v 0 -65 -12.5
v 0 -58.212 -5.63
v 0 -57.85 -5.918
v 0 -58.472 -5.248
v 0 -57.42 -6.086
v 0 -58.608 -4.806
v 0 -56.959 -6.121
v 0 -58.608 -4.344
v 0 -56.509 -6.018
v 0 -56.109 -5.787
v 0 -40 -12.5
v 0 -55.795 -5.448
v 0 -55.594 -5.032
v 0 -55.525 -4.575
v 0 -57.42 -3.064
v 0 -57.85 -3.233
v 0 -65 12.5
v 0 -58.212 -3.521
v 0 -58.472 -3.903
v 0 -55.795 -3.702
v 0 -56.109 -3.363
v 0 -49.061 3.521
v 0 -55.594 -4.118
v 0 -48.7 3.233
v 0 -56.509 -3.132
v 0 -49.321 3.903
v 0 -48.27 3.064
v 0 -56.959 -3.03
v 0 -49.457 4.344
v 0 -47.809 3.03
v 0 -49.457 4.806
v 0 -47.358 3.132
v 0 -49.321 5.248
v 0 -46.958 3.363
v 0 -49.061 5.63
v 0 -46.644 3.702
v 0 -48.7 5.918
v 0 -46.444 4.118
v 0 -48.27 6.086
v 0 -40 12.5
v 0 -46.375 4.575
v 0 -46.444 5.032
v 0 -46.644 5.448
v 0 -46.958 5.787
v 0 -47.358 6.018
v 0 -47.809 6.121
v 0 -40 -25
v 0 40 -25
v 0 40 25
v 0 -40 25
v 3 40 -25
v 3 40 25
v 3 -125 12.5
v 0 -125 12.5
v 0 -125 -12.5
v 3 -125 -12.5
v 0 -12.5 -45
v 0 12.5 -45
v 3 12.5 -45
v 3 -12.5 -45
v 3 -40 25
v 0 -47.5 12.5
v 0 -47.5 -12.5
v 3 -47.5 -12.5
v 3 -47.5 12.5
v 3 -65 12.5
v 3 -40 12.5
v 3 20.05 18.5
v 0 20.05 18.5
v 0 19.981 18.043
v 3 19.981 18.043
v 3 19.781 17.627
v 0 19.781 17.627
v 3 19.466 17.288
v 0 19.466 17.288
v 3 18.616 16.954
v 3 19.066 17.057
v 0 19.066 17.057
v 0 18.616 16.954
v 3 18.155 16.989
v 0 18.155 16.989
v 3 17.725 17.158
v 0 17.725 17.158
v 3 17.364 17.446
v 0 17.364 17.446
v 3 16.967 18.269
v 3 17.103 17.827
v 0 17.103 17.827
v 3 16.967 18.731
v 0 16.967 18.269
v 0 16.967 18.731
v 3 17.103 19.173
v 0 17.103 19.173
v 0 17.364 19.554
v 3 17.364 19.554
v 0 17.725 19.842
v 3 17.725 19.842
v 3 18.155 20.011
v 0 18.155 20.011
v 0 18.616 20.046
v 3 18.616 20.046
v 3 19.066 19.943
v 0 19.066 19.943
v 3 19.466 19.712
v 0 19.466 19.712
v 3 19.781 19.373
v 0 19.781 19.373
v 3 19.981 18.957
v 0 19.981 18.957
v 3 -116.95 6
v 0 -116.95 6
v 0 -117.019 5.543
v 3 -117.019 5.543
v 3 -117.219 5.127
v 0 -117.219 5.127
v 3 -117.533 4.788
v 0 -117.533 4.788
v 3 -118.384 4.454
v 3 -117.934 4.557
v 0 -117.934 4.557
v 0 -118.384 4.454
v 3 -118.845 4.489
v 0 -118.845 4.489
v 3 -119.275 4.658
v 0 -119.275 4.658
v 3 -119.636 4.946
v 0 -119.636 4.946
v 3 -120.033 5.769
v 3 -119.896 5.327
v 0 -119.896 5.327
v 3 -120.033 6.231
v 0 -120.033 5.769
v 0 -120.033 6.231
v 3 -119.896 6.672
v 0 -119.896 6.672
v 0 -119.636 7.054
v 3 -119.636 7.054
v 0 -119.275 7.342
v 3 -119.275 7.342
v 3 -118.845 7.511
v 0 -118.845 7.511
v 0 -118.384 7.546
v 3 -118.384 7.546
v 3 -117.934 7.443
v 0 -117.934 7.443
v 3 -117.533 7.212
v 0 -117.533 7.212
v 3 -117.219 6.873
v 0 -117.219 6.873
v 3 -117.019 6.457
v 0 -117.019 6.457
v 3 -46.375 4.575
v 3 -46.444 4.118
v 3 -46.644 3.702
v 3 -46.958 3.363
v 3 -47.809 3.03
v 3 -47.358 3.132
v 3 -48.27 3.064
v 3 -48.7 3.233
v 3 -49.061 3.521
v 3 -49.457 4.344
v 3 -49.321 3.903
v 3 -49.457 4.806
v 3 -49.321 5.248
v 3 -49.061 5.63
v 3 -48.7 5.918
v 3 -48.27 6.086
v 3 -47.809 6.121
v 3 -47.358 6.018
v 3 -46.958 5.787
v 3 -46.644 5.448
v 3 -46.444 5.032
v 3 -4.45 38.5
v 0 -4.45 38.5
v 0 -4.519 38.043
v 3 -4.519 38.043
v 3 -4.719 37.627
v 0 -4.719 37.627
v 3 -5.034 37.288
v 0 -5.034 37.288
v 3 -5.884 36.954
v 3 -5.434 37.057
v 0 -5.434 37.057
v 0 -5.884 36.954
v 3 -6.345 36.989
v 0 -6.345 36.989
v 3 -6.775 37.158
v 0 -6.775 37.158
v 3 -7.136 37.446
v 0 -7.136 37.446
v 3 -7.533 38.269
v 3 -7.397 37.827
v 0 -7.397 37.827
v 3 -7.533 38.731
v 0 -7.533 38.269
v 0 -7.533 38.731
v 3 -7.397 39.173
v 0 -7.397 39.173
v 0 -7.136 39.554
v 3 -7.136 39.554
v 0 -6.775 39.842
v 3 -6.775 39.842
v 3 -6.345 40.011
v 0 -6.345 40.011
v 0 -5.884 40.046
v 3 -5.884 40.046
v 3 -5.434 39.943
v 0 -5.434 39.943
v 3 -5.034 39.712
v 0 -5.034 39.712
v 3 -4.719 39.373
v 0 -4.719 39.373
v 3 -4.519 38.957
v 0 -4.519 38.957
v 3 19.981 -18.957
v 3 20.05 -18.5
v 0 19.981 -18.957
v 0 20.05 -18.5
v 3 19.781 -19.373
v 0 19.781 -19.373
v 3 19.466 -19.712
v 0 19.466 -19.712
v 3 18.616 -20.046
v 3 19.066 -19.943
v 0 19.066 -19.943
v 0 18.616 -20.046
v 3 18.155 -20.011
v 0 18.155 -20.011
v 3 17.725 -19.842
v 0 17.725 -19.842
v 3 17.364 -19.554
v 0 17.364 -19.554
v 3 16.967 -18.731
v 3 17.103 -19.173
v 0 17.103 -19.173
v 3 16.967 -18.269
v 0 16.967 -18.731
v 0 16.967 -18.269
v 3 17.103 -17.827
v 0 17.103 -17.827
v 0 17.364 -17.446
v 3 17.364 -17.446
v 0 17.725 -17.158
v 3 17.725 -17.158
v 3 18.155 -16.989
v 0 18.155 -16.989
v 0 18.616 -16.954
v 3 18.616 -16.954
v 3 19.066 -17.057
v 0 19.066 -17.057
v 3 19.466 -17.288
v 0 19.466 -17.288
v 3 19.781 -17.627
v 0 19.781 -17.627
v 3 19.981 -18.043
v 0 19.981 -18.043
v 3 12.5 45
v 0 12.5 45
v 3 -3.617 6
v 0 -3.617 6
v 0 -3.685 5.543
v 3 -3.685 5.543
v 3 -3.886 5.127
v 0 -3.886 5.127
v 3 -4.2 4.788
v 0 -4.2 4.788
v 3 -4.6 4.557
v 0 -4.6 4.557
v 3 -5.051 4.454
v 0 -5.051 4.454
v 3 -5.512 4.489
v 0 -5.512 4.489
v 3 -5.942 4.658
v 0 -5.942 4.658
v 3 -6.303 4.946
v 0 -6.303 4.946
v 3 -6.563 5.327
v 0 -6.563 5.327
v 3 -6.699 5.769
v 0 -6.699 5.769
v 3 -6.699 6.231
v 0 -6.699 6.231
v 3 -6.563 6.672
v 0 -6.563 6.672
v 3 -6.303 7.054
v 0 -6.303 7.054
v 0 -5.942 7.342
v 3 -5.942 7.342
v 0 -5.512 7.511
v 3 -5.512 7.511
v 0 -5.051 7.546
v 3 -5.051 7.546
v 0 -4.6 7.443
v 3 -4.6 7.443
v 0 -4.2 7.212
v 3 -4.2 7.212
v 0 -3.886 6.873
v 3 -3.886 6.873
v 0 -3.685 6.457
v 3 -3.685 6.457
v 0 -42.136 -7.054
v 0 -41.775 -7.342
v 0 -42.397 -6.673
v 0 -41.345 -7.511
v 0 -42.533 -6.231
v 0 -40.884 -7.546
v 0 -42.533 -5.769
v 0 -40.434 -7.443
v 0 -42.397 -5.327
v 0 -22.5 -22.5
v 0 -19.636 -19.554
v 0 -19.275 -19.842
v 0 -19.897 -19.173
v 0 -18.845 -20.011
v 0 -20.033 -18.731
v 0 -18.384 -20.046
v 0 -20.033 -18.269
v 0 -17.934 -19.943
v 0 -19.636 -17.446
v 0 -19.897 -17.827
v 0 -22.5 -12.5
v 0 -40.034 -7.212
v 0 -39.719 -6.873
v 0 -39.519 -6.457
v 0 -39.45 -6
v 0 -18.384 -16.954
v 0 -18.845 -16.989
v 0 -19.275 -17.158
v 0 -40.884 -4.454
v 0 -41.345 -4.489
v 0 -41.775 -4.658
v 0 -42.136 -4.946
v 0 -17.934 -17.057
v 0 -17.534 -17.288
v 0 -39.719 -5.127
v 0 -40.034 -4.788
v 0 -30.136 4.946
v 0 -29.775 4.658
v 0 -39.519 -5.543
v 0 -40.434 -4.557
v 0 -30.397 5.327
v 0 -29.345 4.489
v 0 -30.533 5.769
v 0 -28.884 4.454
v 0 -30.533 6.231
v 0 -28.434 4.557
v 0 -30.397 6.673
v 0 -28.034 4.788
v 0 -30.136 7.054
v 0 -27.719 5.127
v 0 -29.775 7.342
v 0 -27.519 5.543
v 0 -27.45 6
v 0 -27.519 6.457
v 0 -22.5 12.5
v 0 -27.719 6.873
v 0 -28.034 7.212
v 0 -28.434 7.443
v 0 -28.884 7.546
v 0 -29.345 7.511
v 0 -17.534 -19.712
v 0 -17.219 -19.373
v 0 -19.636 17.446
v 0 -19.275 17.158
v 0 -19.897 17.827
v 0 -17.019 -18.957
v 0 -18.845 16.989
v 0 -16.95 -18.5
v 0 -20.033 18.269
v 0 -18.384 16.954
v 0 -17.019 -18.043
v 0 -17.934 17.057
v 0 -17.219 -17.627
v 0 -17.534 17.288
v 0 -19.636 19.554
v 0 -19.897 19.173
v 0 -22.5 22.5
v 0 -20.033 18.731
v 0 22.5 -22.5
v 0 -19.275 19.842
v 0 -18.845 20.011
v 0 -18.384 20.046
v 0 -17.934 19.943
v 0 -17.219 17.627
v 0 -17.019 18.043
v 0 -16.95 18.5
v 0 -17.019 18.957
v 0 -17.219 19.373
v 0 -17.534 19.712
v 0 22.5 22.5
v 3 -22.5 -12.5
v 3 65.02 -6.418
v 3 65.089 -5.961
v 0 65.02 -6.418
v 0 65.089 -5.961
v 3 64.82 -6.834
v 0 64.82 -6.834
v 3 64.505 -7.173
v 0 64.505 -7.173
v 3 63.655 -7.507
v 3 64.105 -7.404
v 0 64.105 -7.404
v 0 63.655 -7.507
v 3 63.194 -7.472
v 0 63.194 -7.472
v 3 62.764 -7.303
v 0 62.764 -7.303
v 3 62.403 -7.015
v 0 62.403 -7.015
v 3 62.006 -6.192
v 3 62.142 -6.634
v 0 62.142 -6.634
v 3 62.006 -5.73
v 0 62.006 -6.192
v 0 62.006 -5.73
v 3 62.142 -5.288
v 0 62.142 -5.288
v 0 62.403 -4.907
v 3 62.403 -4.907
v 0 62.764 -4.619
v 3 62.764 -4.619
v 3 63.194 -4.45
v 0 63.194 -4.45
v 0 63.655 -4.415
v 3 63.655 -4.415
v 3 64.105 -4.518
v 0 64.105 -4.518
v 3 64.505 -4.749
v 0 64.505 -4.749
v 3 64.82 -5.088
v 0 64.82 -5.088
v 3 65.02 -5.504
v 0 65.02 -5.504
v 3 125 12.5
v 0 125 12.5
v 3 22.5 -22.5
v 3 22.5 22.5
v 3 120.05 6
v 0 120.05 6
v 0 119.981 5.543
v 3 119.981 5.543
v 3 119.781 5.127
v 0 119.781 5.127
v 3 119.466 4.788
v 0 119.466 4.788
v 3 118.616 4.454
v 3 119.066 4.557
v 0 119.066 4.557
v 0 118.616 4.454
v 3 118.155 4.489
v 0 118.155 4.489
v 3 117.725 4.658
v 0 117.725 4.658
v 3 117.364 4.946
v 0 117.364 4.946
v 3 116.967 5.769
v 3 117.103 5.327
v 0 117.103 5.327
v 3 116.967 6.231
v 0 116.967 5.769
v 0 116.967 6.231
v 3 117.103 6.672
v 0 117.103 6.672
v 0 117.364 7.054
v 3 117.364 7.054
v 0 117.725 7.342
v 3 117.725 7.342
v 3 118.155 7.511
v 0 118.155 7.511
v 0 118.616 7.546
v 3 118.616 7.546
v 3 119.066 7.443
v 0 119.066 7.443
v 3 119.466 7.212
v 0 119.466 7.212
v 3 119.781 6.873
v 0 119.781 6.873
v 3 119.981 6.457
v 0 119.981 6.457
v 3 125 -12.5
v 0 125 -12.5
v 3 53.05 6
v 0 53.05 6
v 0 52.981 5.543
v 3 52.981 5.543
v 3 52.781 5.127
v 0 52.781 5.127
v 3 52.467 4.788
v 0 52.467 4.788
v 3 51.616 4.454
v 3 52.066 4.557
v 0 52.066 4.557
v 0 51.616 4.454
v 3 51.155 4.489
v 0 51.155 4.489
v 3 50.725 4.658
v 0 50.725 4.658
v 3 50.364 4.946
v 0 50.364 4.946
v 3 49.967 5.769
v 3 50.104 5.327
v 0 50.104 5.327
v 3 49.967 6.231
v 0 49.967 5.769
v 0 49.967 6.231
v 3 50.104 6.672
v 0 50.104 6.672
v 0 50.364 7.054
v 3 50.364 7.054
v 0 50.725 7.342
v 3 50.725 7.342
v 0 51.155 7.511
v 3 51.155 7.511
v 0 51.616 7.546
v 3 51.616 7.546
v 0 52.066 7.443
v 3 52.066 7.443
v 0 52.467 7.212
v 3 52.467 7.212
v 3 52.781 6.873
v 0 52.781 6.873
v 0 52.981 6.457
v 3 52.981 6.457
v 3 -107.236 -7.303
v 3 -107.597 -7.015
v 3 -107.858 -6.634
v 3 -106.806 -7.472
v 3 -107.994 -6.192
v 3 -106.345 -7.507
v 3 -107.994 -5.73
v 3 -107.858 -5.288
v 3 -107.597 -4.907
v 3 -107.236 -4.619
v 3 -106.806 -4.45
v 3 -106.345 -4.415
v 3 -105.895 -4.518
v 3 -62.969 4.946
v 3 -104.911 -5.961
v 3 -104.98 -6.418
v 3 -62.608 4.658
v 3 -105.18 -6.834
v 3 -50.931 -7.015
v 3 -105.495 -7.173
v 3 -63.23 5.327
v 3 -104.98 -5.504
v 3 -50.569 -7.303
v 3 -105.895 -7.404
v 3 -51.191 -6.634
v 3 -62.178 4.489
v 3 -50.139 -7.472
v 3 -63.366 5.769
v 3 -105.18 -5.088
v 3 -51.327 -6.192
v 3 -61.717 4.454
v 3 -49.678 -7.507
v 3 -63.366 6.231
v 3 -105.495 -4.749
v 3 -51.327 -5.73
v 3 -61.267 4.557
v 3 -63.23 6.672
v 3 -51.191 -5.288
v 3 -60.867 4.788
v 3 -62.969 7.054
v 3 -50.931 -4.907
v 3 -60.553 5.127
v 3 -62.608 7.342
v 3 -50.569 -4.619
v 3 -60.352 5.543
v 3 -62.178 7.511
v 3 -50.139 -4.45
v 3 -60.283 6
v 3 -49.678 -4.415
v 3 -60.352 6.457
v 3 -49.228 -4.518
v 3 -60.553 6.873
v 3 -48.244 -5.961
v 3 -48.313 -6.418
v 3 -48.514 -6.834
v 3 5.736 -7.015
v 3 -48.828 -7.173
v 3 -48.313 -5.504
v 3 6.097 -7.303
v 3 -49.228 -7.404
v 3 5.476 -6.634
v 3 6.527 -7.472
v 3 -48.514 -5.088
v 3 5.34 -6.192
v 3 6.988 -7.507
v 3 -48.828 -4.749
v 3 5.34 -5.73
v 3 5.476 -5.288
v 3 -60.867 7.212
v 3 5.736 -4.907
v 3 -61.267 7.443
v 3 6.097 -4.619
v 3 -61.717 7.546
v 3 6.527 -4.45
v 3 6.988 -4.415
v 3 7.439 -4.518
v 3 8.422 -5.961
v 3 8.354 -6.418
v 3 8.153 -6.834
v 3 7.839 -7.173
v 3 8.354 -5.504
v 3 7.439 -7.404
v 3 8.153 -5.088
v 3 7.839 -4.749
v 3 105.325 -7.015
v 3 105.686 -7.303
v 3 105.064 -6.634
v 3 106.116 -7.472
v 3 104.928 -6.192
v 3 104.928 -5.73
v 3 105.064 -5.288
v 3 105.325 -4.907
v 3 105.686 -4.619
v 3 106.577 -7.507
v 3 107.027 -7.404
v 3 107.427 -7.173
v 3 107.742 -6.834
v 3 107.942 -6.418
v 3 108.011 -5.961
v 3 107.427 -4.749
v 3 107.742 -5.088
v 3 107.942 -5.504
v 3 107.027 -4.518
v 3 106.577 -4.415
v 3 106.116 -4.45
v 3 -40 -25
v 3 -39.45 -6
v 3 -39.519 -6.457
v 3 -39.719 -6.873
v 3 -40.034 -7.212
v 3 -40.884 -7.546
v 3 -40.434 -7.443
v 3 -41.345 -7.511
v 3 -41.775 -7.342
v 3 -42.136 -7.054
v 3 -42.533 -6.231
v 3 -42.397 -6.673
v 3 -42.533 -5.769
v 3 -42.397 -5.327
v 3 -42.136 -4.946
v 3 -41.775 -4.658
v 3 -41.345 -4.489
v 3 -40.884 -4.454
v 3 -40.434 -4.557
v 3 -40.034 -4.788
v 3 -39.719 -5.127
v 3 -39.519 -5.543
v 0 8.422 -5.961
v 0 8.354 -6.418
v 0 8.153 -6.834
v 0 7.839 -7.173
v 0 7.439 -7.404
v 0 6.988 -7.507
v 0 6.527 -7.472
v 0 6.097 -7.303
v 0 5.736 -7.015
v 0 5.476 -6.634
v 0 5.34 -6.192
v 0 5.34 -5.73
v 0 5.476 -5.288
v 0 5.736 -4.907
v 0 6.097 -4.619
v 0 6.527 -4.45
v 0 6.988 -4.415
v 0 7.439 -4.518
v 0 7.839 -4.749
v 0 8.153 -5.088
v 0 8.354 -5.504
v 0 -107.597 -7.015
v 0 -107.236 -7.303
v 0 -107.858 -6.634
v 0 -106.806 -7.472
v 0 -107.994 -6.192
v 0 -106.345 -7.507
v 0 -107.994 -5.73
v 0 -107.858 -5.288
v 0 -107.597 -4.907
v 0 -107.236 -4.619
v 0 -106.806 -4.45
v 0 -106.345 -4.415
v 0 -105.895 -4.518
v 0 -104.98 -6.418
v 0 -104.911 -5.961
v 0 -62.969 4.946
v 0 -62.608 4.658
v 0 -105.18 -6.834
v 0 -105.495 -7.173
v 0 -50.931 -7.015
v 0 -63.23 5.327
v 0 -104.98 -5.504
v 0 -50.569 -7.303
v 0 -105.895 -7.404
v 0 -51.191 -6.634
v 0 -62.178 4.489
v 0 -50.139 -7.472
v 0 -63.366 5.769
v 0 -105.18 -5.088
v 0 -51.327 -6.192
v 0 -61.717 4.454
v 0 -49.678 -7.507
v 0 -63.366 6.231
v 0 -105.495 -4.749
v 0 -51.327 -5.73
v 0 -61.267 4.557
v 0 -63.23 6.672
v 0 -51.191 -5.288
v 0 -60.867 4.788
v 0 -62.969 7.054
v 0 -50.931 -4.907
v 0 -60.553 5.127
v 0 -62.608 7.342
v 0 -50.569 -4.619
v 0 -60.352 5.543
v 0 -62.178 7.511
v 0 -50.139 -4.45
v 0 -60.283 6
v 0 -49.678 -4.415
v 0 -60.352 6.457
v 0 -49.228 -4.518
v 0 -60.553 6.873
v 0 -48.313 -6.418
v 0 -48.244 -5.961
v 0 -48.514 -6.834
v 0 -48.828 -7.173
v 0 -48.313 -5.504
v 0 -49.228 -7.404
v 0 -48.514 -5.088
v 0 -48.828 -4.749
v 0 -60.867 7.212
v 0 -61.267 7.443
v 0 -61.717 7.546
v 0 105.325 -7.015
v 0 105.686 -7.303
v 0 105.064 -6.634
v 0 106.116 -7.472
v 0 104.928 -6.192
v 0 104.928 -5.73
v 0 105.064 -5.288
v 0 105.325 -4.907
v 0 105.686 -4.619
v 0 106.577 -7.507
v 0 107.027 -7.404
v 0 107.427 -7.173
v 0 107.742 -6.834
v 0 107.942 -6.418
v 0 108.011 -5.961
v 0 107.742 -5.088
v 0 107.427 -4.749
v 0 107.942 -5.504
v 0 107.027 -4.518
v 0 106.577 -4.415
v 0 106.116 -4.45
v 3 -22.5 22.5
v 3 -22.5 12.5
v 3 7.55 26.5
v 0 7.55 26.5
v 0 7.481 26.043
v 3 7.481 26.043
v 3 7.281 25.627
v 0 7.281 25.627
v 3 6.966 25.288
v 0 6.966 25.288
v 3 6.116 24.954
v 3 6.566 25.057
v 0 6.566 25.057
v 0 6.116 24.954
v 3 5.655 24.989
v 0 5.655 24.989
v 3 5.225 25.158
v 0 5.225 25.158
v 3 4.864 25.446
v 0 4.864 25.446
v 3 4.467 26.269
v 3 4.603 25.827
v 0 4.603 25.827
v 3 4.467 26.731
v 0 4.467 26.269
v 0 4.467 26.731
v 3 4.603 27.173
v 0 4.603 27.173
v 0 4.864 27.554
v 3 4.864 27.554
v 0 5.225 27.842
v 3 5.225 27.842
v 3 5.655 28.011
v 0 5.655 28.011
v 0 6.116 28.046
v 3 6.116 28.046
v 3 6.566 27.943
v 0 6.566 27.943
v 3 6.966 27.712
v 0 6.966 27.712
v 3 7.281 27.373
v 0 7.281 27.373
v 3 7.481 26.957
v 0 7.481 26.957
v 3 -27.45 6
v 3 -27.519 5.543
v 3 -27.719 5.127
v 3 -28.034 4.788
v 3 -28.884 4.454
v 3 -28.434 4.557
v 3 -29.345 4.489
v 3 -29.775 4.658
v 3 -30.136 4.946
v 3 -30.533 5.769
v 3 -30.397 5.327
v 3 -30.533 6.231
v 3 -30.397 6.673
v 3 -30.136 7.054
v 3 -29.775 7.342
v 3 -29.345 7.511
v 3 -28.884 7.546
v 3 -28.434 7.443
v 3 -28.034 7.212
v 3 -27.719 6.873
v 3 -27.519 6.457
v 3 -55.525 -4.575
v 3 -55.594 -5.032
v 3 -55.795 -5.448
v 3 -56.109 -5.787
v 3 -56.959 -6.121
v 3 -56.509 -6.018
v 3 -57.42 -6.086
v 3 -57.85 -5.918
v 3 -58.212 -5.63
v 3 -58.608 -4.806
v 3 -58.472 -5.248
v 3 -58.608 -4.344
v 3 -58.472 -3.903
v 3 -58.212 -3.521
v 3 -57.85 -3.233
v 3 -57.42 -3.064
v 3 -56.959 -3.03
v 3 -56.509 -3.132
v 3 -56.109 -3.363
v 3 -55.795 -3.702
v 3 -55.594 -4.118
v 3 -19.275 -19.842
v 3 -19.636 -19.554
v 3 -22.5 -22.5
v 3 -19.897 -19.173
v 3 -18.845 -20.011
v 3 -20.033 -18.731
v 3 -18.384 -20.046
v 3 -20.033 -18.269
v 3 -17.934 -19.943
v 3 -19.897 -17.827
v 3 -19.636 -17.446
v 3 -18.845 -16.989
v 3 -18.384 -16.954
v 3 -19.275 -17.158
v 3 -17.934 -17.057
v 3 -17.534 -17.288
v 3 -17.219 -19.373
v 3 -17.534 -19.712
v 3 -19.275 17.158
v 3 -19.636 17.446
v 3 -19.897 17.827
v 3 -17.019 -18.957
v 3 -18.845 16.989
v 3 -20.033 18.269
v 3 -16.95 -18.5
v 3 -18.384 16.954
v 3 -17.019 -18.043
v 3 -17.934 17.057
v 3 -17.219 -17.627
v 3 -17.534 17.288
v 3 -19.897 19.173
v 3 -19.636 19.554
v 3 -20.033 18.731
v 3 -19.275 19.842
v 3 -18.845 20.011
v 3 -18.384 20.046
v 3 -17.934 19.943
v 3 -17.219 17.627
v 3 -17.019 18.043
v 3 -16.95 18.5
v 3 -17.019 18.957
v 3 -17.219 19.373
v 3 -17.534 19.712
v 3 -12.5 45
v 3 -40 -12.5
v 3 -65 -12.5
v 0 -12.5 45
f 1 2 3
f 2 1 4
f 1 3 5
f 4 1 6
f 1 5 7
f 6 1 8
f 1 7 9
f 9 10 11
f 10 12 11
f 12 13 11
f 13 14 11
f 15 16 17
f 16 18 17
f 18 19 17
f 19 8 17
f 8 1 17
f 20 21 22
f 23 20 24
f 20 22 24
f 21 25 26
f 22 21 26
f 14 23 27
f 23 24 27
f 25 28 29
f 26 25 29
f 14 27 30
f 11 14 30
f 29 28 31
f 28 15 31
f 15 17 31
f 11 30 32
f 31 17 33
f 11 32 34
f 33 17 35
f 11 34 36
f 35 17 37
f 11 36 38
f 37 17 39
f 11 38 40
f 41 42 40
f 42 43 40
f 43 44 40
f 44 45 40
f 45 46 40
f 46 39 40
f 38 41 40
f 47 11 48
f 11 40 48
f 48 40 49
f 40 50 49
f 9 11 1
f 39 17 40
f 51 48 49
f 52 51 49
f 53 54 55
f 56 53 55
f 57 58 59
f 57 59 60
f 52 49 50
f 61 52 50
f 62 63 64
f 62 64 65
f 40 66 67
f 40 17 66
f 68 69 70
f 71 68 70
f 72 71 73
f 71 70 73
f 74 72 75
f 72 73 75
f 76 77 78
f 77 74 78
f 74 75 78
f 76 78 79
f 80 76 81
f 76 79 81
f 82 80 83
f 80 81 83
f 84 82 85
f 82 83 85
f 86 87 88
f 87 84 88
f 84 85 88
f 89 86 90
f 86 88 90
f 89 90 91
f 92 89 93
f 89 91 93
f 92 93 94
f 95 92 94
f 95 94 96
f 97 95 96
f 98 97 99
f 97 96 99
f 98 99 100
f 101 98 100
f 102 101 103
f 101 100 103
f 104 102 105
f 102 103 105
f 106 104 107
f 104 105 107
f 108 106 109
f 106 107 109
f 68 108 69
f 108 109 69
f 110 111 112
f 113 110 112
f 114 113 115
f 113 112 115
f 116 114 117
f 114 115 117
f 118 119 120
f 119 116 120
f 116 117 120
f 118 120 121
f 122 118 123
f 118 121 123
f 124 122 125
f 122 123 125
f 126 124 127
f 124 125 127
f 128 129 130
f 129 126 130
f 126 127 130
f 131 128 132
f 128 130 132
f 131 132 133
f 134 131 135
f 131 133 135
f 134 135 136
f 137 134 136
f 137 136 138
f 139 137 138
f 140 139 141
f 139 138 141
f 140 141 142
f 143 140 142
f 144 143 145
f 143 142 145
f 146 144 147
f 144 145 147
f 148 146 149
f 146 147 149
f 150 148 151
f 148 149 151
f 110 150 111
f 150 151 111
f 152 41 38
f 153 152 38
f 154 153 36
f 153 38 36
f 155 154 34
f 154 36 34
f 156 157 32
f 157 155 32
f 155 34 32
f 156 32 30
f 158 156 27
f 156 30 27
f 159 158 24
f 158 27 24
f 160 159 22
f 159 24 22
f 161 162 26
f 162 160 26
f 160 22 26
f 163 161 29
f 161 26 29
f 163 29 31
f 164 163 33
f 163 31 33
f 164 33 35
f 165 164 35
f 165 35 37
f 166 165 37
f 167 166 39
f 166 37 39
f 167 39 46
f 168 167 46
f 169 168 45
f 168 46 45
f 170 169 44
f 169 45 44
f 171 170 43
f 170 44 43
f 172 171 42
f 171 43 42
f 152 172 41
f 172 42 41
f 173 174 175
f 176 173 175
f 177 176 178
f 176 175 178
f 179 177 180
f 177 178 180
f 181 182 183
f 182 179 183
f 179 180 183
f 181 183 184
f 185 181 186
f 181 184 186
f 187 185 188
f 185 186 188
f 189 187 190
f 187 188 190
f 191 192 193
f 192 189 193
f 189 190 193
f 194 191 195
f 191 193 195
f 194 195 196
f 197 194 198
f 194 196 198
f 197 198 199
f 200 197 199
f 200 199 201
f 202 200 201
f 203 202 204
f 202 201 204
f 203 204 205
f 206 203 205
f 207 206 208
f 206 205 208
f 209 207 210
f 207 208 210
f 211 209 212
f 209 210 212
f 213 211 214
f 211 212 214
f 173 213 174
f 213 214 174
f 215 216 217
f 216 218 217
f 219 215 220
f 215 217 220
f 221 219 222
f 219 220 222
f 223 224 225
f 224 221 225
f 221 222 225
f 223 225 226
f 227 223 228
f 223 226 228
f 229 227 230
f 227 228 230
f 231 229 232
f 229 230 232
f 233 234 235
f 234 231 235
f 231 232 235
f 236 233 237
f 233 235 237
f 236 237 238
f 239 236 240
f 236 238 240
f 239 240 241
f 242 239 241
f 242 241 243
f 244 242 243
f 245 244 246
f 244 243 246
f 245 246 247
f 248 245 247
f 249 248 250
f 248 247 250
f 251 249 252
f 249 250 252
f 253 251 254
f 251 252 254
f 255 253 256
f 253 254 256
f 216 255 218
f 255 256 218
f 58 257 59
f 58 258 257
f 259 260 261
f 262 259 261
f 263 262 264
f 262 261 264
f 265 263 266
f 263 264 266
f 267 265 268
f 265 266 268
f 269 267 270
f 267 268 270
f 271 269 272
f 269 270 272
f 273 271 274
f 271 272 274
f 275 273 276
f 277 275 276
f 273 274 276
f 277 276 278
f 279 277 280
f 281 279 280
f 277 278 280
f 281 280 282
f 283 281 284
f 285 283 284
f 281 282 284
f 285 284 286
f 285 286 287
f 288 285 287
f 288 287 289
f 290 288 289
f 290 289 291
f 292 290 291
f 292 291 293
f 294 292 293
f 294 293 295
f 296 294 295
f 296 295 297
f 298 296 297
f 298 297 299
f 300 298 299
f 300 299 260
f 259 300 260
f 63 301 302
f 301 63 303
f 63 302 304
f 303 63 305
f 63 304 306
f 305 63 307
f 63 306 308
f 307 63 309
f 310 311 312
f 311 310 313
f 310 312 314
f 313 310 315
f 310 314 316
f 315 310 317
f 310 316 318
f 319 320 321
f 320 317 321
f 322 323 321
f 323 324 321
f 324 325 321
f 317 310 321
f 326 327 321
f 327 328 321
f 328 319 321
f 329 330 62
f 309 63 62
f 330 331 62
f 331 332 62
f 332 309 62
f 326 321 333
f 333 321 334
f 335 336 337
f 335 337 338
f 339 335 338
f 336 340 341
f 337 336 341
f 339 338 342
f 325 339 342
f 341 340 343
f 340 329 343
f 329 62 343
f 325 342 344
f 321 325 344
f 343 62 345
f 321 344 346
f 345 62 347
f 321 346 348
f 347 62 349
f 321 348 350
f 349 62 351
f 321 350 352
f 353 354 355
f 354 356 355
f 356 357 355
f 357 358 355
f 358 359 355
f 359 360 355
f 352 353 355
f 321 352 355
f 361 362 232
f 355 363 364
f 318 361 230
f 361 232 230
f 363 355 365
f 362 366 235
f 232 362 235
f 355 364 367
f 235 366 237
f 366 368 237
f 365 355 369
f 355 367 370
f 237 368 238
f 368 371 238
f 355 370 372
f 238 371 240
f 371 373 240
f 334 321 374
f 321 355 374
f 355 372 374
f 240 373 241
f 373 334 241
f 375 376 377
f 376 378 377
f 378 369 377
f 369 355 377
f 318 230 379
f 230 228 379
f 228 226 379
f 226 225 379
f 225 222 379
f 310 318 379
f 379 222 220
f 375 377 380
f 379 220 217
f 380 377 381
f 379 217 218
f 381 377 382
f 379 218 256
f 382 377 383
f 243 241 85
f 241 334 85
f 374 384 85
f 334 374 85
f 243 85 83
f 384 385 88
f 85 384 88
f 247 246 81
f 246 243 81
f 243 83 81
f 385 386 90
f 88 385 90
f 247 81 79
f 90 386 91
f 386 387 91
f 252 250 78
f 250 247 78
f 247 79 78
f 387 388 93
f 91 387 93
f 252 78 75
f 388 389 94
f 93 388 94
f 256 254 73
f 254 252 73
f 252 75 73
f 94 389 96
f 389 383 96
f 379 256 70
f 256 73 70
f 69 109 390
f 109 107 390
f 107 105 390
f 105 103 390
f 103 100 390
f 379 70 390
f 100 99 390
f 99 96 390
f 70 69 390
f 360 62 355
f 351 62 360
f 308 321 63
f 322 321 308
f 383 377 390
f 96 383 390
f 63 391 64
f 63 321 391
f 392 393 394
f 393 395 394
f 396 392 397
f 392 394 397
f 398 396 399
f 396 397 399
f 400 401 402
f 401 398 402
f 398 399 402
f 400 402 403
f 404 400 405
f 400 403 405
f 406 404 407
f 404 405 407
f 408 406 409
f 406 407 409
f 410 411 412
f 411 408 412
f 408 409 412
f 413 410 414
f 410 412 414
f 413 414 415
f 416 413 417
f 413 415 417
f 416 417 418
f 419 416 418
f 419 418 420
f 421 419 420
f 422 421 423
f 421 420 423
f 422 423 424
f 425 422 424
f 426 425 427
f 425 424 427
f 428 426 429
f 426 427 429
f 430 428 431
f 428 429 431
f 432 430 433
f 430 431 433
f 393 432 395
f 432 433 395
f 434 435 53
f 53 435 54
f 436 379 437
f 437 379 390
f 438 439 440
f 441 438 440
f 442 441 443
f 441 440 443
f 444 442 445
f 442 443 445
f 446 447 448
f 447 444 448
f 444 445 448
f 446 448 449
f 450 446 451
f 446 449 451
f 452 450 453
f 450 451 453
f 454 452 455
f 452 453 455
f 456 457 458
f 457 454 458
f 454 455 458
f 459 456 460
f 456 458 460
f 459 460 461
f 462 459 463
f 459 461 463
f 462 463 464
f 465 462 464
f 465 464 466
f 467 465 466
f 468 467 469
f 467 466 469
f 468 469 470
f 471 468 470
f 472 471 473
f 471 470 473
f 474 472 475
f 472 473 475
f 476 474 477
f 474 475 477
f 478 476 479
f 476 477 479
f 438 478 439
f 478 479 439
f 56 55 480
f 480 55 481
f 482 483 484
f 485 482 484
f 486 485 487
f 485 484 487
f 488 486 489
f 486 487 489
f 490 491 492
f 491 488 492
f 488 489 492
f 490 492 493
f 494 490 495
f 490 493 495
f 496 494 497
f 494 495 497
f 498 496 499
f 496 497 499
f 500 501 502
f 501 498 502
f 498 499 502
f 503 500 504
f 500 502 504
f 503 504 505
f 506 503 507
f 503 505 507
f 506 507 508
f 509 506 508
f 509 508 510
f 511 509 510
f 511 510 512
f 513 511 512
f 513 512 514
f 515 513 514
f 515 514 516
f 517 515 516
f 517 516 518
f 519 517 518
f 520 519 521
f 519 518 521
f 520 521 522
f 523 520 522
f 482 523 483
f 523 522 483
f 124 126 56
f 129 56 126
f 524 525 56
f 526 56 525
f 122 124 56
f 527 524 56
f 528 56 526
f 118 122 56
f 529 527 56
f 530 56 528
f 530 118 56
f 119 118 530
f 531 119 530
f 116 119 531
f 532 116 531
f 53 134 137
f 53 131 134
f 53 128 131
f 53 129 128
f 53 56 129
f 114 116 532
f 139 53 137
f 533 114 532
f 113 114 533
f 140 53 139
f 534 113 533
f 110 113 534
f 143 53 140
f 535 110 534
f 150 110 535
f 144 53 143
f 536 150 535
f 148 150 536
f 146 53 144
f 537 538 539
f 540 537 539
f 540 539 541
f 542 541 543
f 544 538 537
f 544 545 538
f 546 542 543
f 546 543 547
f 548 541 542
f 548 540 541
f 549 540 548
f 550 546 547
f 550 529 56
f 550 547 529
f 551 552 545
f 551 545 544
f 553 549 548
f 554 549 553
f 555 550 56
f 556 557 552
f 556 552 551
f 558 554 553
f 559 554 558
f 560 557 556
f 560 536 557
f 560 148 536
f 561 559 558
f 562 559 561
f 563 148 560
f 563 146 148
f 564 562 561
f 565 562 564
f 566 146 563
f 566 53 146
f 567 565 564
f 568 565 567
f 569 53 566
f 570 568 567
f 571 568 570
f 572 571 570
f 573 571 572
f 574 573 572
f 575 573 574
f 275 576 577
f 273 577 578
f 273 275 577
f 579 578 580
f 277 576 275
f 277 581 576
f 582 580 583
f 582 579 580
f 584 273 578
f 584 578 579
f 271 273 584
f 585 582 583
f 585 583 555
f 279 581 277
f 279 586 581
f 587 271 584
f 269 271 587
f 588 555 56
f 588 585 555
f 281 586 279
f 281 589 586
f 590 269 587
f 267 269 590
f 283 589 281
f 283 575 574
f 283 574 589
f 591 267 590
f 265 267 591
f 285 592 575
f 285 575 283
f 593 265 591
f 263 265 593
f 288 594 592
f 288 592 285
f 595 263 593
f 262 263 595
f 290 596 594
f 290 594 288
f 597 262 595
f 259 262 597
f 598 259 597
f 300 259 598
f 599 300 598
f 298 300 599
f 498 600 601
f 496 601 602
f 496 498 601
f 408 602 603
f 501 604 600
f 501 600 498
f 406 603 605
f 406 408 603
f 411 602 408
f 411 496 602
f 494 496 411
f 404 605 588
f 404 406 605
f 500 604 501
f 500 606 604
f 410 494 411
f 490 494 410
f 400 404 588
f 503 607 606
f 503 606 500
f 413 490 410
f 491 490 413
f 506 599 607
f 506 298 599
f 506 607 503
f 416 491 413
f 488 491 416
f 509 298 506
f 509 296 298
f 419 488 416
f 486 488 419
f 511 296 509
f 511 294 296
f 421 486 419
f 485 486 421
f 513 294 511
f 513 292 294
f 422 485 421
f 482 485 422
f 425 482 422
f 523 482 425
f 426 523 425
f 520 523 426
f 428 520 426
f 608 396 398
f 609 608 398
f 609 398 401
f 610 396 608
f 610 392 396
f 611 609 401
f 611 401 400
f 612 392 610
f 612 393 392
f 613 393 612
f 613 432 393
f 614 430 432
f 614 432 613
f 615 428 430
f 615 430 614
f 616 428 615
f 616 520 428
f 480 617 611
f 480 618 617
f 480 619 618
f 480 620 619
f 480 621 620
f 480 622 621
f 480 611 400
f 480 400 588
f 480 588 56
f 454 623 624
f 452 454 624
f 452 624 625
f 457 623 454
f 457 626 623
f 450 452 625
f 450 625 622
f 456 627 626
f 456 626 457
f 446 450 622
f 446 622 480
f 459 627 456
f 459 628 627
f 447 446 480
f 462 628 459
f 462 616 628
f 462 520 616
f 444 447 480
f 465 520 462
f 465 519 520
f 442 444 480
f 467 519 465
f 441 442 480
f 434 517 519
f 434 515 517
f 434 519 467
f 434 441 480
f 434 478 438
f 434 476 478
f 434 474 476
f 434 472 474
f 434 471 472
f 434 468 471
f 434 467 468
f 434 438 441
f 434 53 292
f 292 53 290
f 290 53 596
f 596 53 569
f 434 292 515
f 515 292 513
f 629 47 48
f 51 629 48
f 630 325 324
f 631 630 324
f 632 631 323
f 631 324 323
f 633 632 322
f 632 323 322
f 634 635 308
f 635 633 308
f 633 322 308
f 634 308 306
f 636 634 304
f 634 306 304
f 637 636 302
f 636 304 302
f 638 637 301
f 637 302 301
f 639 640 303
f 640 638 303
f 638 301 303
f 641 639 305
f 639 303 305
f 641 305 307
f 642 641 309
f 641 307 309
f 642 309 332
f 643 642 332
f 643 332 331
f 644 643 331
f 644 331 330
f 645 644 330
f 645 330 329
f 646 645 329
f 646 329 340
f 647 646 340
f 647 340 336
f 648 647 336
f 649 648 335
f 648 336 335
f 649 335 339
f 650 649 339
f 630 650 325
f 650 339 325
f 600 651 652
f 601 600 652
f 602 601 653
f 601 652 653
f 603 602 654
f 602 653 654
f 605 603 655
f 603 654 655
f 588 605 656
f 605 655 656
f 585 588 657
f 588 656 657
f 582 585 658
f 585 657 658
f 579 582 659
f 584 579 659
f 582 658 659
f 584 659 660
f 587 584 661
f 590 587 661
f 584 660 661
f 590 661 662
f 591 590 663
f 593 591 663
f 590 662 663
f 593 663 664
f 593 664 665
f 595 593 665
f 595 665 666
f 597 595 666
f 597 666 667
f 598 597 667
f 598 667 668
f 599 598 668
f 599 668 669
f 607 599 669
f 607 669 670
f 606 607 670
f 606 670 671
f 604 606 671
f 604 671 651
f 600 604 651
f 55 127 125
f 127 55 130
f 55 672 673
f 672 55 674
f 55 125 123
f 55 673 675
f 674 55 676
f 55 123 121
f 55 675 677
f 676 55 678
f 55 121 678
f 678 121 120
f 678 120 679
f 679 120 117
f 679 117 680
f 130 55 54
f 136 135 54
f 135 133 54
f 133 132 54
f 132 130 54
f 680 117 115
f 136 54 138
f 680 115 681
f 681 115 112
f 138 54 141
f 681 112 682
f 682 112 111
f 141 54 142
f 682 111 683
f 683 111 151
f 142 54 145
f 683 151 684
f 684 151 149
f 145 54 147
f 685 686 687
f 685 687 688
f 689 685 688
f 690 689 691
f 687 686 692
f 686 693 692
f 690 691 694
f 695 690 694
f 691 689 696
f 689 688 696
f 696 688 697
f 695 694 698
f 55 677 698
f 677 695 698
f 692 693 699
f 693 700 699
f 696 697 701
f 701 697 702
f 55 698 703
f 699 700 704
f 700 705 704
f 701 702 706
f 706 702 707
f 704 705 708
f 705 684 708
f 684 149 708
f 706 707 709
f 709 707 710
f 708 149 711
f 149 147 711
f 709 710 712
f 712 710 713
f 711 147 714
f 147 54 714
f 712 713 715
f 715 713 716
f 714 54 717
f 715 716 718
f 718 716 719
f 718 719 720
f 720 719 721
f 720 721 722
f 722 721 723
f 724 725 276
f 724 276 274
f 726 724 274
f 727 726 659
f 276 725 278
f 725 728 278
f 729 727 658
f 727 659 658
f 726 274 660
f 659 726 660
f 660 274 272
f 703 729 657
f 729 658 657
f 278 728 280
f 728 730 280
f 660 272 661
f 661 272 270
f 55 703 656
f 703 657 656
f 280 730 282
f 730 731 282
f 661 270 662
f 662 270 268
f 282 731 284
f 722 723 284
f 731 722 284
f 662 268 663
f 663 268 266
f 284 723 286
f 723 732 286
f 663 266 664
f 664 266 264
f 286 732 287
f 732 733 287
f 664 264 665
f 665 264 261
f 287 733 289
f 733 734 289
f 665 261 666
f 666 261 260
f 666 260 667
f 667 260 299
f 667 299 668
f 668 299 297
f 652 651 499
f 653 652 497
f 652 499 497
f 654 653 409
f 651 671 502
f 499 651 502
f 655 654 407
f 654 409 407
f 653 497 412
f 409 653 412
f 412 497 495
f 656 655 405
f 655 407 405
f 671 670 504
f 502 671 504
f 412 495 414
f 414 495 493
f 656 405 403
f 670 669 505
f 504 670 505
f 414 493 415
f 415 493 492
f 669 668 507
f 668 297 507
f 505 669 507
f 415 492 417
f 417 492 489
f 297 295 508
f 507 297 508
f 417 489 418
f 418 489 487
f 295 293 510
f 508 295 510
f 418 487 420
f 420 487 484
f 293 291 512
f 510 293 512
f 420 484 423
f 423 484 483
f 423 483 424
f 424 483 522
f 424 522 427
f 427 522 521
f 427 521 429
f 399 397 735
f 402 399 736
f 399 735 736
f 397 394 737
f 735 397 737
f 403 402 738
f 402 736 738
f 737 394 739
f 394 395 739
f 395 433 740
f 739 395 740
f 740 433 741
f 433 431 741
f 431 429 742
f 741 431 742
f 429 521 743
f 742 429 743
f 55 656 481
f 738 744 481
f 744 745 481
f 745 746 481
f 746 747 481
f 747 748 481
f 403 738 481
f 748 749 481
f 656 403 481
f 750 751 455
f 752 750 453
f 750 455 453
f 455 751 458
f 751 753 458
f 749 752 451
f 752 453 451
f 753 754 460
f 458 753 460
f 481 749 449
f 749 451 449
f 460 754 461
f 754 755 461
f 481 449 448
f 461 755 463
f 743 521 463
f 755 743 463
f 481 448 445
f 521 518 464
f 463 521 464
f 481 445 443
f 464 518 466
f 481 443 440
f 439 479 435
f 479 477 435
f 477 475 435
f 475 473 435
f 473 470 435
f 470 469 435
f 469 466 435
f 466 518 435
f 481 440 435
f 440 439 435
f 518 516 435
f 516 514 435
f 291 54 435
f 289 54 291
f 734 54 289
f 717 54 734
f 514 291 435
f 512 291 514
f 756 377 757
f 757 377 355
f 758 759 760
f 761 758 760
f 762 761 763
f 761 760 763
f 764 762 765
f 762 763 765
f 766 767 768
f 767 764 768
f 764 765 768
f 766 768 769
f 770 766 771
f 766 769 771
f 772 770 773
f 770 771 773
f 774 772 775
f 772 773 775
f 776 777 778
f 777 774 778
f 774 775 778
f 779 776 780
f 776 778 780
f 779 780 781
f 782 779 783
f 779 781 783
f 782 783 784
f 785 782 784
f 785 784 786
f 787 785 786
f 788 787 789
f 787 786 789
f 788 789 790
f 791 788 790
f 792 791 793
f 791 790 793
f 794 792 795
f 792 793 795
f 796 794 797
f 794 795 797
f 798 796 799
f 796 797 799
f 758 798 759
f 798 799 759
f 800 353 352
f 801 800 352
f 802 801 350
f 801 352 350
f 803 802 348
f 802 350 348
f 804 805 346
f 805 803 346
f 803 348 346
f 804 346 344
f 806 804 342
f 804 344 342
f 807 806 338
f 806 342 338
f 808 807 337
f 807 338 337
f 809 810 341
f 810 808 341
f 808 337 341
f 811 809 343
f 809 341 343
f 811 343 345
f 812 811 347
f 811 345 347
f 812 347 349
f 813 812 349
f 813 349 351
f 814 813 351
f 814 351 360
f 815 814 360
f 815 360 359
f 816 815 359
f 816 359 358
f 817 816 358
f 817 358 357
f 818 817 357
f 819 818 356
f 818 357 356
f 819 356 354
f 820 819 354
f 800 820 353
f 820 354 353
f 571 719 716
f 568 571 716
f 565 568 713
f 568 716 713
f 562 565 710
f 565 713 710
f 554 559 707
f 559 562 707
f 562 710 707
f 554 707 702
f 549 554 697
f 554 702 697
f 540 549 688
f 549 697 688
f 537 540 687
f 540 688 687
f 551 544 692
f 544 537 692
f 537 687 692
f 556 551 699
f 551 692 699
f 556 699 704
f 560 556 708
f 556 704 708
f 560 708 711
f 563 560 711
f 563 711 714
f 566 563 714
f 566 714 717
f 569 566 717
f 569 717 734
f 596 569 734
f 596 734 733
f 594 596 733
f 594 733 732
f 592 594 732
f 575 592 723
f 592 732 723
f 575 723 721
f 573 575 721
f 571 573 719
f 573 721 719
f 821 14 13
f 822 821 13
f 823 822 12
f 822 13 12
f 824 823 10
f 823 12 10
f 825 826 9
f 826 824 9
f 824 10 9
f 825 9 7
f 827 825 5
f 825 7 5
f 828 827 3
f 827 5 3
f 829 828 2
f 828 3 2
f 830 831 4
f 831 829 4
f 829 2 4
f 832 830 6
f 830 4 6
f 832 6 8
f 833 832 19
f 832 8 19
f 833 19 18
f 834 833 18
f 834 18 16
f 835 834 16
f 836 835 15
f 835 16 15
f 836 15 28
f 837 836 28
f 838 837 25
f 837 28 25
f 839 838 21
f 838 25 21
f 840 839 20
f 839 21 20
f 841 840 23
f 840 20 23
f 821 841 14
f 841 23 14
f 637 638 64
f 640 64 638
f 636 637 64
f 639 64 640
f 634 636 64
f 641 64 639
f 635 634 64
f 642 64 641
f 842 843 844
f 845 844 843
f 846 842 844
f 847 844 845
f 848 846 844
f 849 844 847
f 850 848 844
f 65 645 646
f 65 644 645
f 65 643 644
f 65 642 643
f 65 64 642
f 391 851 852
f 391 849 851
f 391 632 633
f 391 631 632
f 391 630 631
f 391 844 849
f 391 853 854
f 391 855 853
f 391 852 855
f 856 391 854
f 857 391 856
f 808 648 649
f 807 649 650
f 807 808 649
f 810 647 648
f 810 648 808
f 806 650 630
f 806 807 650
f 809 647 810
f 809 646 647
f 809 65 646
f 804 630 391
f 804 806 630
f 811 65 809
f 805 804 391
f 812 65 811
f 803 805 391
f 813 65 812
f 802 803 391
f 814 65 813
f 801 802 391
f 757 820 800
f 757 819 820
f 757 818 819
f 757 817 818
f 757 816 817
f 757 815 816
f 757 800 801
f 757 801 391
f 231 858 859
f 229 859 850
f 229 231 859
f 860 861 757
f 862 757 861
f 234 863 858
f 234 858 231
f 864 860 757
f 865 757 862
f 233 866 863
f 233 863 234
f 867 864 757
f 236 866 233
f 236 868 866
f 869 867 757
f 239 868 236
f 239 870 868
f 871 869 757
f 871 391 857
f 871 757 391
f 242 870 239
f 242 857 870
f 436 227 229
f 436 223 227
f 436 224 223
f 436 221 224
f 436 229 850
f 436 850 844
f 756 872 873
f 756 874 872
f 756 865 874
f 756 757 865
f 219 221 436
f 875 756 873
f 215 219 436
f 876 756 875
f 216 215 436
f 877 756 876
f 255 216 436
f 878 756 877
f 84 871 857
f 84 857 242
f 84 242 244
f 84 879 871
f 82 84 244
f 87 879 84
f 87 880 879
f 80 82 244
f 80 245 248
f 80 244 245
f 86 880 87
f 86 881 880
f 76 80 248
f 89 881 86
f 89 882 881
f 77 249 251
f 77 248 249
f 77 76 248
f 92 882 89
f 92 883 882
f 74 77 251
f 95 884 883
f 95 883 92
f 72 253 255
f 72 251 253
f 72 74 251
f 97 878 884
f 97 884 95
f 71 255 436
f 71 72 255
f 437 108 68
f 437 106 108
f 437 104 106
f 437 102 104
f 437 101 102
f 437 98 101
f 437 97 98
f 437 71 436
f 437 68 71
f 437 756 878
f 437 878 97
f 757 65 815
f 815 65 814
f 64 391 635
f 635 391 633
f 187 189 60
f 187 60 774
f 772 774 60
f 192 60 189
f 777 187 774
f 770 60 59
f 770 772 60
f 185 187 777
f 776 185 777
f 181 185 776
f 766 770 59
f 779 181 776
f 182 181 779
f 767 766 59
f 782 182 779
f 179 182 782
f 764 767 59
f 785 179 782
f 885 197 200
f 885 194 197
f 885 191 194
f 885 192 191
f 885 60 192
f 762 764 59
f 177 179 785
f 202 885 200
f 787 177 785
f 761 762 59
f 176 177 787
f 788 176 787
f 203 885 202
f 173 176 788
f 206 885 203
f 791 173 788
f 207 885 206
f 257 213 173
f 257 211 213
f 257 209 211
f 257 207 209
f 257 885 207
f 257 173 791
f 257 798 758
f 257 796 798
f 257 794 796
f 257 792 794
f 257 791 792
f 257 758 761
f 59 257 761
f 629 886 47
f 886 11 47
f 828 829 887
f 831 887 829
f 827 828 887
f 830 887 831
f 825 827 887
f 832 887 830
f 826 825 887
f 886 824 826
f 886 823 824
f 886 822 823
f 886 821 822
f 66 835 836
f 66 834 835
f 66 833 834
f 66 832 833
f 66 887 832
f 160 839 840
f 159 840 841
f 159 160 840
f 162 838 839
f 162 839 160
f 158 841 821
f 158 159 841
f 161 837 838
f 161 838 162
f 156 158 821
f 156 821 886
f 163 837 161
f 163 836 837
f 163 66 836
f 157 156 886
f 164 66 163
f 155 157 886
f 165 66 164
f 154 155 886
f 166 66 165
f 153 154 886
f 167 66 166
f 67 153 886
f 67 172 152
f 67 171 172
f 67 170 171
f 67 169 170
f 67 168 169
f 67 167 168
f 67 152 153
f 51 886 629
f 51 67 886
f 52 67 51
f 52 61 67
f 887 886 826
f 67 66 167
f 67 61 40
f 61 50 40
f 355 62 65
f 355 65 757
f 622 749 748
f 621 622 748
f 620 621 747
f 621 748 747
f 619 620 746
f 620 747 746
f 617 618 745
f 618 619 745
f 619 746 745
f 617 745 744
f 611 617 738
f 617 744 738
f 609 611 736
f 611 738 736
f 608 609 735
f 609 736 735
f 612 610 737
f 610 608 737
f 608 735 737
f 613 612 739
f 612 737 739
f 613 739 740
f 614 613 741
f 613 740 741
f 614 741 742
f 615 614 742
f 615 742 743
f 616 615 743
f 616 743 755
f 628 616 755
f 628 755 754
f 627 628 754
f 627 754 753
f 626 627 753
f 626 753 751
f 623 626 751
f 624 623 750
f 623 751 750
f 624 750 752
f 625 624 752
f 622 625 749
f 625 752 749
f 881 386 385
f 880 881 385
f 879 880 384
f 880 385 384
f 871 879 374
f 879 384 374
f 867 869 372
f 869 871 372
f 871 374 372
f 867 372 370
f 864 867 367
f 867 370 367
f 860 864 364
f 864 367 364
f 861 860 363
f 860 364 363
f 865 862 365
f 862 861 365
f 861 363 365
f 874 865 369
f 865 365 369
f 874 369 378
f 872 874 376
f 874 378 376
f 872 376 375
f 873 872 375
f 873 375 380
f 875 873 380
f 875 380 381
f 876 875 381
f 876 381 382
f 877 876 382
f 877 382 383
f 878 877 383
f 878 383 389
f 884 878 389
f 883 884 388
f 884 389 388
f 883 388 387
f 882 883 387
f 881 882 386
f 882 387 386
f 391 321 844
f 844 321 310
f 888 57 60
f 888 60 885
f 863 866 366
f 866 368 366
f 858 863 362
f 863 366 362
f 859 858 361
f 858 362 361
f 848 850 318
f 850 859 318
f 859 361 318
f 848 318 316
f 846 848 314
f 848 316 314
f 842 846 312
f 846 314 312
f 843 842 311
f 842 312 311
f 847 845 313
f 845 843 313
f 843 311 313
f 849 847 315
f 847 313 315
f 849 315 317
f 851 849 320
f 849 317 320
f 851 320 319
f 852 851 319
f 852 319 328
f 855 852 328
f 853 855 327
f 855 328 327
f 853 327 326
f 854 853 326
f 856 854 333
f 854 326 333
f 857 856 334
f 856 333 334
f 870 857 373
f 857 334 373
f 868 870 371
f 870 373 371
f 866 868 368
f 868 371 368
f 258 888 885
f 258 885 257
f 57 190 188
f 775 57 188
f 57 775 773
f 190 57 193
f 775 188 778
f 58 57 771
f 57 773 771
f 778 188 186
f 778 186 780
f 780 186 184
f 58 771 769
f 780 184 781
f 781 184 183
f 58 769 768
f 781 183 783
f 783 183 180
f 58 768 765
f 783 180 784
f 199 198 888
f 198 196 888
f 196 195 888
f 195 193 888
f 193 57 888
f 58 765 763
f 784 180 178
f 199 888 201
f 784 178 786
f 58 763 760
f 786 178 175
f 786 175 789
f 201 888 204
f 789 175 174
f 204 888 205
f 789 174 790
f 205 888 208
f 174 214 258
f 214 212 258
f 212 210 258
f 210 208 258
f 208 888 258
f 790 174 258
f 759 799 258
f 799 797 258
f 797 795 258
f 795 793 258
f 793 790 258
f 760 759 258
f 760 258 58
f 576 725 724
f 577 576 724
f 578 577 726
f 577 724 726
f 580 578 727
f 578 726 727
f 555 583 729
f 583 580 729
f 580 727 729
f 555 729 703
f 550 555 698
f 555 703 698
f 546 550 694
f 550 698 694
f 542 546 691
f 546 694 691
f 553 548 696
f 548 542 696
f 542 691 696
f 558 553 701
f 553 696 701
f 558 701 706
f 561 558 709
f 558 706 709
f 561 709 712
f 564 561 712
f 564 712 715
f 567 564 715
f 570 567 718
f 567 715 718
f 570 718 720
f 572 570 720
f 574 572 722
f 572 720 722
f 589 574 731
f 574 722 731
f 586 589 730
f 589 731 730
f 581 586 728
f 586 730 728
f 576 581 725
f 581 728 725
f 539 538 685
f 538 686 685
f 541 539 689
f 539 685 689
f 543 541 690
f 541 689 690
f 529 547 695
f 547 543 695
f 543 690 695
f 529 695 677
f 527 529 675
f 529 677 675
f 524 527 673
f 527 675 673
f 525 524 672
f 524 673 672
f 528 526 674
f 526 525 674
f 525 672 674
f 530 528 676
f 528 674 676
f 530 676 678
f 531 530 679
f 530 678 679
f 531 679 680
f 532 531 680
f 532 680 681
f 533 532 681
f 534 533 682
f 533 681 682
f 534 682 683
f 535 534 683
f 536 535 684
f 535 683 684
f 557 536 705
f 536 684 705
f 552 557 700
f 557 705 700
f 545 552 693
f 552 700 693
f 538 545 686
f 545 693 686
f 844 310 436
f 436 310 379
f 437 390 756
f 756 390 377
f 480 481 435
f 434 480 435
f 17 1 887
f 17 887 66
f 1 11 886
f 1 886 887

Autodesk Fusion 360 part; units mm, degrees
sketch "Sketch1" plane through (0, 0, 0) normal (1, 0, 0) x (0, 1, 0) in component "Motor driver fitter"
  line L0 (-22.5, -22.5) -> (22.5, -22.5)
  line L1 (-47.5, -12.5) -> (-47.5, 12.5)
  line L2 (-22.5, -12.5) -> (-47.5, -12.5)
  circle A0 centre (-29, 6) radius 1.55
  circle A1 centre (-41, -6) radius 1.55
  line L3 (-47.5, 12.5) -> (-22.5, 12.5)
  line L4 (22.5, 22.5) -> (-22.5, 22.5)
  line L5 (22.5, -22.5) -> (22.5, 22.5)
  circle A2 centre (-18.5, 18.5) radius 1.55
  line L6 (-22.5, 22.5) -> (22.5, -22.5) construction
  line L7 (-22.5, -22.5) -> (22.5, 22.5) construction
  circle A3 centre (18.5, 18.5) radius 1.55
  circle A4 centre (-18.5, -18.5) radius 1.55
  circle A5 centre (18.5, -18.5) radius 1.55
  line L8 (-22.5, 22.5) -> (-22.5, 12.5)
  line L9 (-22.5, -12.5) -> (-22.5, -22.5)
  line L10 (-22.5, 12.5) -> (-47.5, -12.5) construction
  line L11 (-41, -6) -> (-47.5, -12.5) construction
  line L12 (-29, 6) -> (-22.5, 12.5) construction
  dimension "d171" = 45
  dimension "d172" = 45
  dimension "d174" = 3.1
  dimension "d185" = 3.1
  dimension "d186" = 3.1
  dimension "d188" = 25
  dimension "d189" = 25
  dimension "d192" = 18.5
  dimension "d193" = 18.5
  dimension "d225" = 16.9706
sketch "Sketch1 (2)" plane through (0, 0, 0) normal (1, 0, 0) x (0, 1, 0) in component "Chassis frame"
  line L0 (-125, 12.5) -> (-125, -12.5)
  circle A0 centre (-106.461, -5.961) radius 1.55
  line L1 (125, -12.5) -> (125, 12.5)
  line L2 (125, 12.5) -> (-125, 12.5)
  circle A1 centre (-118.4999, 5.9999) radius 1.55
  line L3 (-125, -12.5) -> (125, -12.5)
  line L4 (-125, 12.5) -> (125, -12.5) construction
  line L5 (-125, -12.5) -> (125, 12.5) construction
  line L6 (-22.5, 22.5) -> (22.5, -22.5)
  circle A2 centre (-6, 115) radius 1.55
  circle A3 centre (6, 103) radius 1.55
  line L7 (0, 12.5) -> (0, -12.5) construction
  line L8 (-125, 12.5) -> (-100, -12.5) construction
  line L9 (-125, 12.5) -> (-91.4846, 12.5) construction
  line L10 (-125, 12.5) -> (-118.4999, 5.9999) construction
  line L11 (-106.461, -5.961) -> (-100, -12.5) construction
  circle A4 centre (118.4999, 5.9999) radius 1.55
  circle A5 centre (106.461, -5.961) radius 1.55
  circle A6 centre (-49.7943, -5.961) radius 1.55
  circle A7 centre (-61.8332, 5.9999) radius 1.55
  circle A8 centre (6.8724, -5.961) radius 1.55
  circle A9 centre (-5.1666, 5.9999) radius 1.55
  circle A10 centre (63.539, -5.961) radius 1.55
  circle A11 centre (51.5001, 5.9999) radius 1.55
  point P0 (22, -6.0625)
  dimension "d199" = 250
  dimension "d200" = 25
  dimension "d201" = 3.1
  dimension "d202" = 3.1
  dimension "d231" = 45
  dimension "d232" = 16.9706
  dimension "d235" = 170
  dimension "d236" = 0
sketch "Sketch1 (3)" plane through (0, 0, 0) normal (1, 0, 0) x (0, 1, 0) in component "Motor fitter"
  line L0 (-12.5, -45) -> (-12.5, 45)
  line L1 (-12.5, 45) -> (12.5, 45)
  line L2 (12.5, 45) -> (12.5, -45)
  line L3 (12.5, -45) -> (-12.5, -45)
  line L4 (-12.5, -45) -> (12.5, 45) construction
  line L5 (-12.5, 45) -> (12.5, -45) construction
  line L6 (-12.5, 45) -> (12.5, 20) construction
  line L7 (-12.5, 45) -> (24.7988, 45) construction
  circle A0 centre (-6, 38.5) radius 1.55
  circle A1 centre (6, 26.5) radius 1.55
  line L8 (6, 26.5) -> (12.5, 20) construction
  line L9 (-6, 38.5) -> (-12.5, 45) construction
  dimension "d222" = 25
  dimension "d223" = 90
  dimension "d227" = 45
  dimension "d228" = 3.1
  dimension "d229" = 3.1
  dimension "d230" = 16.9706
sketch "Sketch1 (4)" plane through (0, 0, 0) normal (1, 0, 0) x (0, 1, 0) in component "Breadboard fitter"
  line L0 (-65, 12.5) -> (-40, 12.5)
  line L1 (-40, 12.5) -> (-40, -12.5)
  line L2 (-40, -12.5) -> (-65, -12.5)
  line L3 (-65, -12.5) -> (-65, 12.5)
  line L4 (40, 25) -> (-40, 25)
  line L5 (-40, 25) -> (-40, -25)
  line L6 (-40, -25) -> (40, -25)
  line L7 (40, -25) -> (40, 25)
  line L8 (40, 25) -> (-40, -25) construction
  line L9 (-40, 25) -> (40, -25) construction
  circle A0 centre (-57.0753, -4.5753) radius 1.55
  circle A1 centre (-47.9247, 4.5753) radius 1.55
  line L10 (-47.9247, 4.5753) -> (-40, 12.5) construction
  line L11 (-57.0753, -4.5753) -> (-65, -12.5) construction
  dimension "d237" = 25
  dimension "d238" = 25
  dimension "d239" = 80
  dimension "d240" = 50
  dimension "d241" = 3.1
  dimension "d242" = 3.1
  dimension "d244" = 12.9408
  dimension "d245" = 45
extrude "Extrude1" add sketch "Sketch1 (4)" along normal blind 3 makes body 1 in component "Breadboard fitter"
sketch "Laser cut sketch" plane through (3, 0, 0) normal (1, 0, 0) x (0, 1, 0) in component "Breadboard fitter"
  circle A0 centre (-57.0753, -4.5753) radius 1.55
  circle A1 centre (-47.9247, 4.5753) radius 1.55
  line L0 (-40, -12.5) -> (-40, -25)
  line L1 (-40, -25) -> (40, -25)
  line L2 (40, -25) -> (40, 25)
  line L3 (40, 25) -> (-40, 25)
  line L4 (-40, 25) -> (-40, 12.5)
  line L5 (-40, 12.5) -> (-65, 12.5)
  line L6 (-65, 12.5) -> (-65, -12.5)
  line L7 (-65, -12.5) -> (-40, -12.5)
extrude "Extrude1'" add sketch "Sketch1 (3)" along normal blind 3 separate body makes body 2 in component "Motor fitter"
sketch "Laser cut sketch (2)" plane through (0, 0, 0) normal (1, 0, 0) x (0, 1, 0) in component "Motor fitter"
  circle A0 centre (-6, 38.5) radius 1.55
  circle A1 centre (6, 26.5) radius 1.55
  line L0 (12.5, -45) -> (12.5, 45)
  line L1 (12.5, 45) -> (-12.5, 45)
  line L2 (-12.5, 45) -> (-12.5, -45)
  line L3 (-12.5, -45) -> (12.5, -45)
extrude "Extrude1''" add sketch "Sketch1 (2)" along normal blind 3 separate body contours L0 L2 L3 L6 A8 A9 | L1 L2 L3 L6 A8 A9 makes body 3 in component "Chassis frame"
sketch "Laser cut sketch (3)" plane through (3, 0, 0) normal (1, 0, 0) x (0, 1, 0) in component "Chassis frame"
  circle A0 centre (51.5001, 5.9999) radius 1.55
  circle A1 centre (6.8724, -5.961) radius 1.55
  circle A2 centre (-118.4999, 5.9999) radius 1.55
  circle A3 centre (-106.461, -5.961) radius 1.55
  circle A4 centre (-5.1666, 5.9999) radius 1.55
  circle A5 centre (118.4999, 5.9999) radius 1.55
  circle A6 centre (106.461, -5.961) radius 1.55
  circle A7 centre (63.539, -5.961) radius 1.55
  circle A8 centre (-61.8332, 5.9999) radius 1.55
  circle A9 centre (-49.7943, -5.961) radius 1.55
  line L0 (-125, -12.5) -> (125, -12.5)
  line L1 (125, -12.5) -> (125, 12.5)
  line L2 (125, 12.5) -> (-125, 12.5)
  line L3 (-125, 12.5) -> (-125, -12.5)
extrude "Extrude1'''" add sketch "Sketch1" along normal blind 3 separate body makes body 4 in component "Motor driver fitter"
sketch "Laser cut sketch (4)" plane through (3, 0, 0) normal (1, 0, 0) x (0, 1, 0) in component "Motor driver fitter"
  circle A0 centre (-29, 6) radius 1.55
  circle A1 centre (-18.5, -18.5) radius 1.55
  circle A2 centre (18.5, 18.5) radius 1.55
  circle A3 centre (-18.5, 18.5) radius 1.55
  circle A4 centre (-41, -6) radius 1.55
  circle A5 centre (18.5, -18.5) radius 1.55
  line L0 (-47.5, -12.5) -> (-22.5, -12.5)
  line L1 (-22.5, -12.5) -> (-22.5, -22.5)
  line L2 (-22.5, -22.5) -> (22.5, -22.5)
  line L3 (22.5, -22.5) -> (22.5, 22.5)
  line L4 (22.5, 22.5) -> (-22.5, 22.5)
  line L5 (-22.5, 22.5) -> (-22.5, 12.5)
  line L6 (-22.5, 12.5) -> (-47.5, 12.5)
  line L7 (-47.5, 12.5) -> (-47.5, -12.5)
extrude "Extrude2" [suppressed]
component "Motor driver fitter" placed x (1, 0, 0) y (0, 1, 0) z (0, 0, 1) at (0, 0, 0)
component "Chassis frame" placed x (1, 0, 0) y (0, 1, 0) z (0, 0, 1) at (0, 0, 0)
component "Motor fitter" placed x (1, 0, 0) y (0, 1, 0) z (0, 0, 1) at (0, 0, 0)
component "Breadboard fitter" placed x (1, 0, 0) y (0, 1, 0) z (0, 0, 1) at (0, 0, 0)
equation "partLength = 250 mm"
equation "partWidth = 25 mm"
equation "boltHole = 3.1 mm"
equation "boltFromEdgesClose = 10 mm"
equation "boltGap = 12 mm"
equation "boltFromEdgesFar = 40 mm"
equation "boltGapFromSide = ( partWidth - boltGap ) / 2"
equation "d174 = boltHole"
equation "d185 = boltHole"
equation "d186 = boltHole"
equation "d192 = ( 37 / 2 ) * 1 mm"
equation "d193 = ( 37 / 2 ) * 1 mm"
equation "d199 = partLength"
equation "d200 = partWidth"
equation "d201 = boltHole"
equation "d202 = boltHole"
equation "d222 = partWidth"
equation "d225 = boltGapDiag"
equation "boltGapDiag = boltGap * sqrt(2)"
equation "d228 = boltHole"
equation "d229 = boltHole"
equation "d230 = boltGapDiag"
equation "d232 = boltGapDiag"
equation "d241 = boltHole"
equation "d242 = boltHole"
